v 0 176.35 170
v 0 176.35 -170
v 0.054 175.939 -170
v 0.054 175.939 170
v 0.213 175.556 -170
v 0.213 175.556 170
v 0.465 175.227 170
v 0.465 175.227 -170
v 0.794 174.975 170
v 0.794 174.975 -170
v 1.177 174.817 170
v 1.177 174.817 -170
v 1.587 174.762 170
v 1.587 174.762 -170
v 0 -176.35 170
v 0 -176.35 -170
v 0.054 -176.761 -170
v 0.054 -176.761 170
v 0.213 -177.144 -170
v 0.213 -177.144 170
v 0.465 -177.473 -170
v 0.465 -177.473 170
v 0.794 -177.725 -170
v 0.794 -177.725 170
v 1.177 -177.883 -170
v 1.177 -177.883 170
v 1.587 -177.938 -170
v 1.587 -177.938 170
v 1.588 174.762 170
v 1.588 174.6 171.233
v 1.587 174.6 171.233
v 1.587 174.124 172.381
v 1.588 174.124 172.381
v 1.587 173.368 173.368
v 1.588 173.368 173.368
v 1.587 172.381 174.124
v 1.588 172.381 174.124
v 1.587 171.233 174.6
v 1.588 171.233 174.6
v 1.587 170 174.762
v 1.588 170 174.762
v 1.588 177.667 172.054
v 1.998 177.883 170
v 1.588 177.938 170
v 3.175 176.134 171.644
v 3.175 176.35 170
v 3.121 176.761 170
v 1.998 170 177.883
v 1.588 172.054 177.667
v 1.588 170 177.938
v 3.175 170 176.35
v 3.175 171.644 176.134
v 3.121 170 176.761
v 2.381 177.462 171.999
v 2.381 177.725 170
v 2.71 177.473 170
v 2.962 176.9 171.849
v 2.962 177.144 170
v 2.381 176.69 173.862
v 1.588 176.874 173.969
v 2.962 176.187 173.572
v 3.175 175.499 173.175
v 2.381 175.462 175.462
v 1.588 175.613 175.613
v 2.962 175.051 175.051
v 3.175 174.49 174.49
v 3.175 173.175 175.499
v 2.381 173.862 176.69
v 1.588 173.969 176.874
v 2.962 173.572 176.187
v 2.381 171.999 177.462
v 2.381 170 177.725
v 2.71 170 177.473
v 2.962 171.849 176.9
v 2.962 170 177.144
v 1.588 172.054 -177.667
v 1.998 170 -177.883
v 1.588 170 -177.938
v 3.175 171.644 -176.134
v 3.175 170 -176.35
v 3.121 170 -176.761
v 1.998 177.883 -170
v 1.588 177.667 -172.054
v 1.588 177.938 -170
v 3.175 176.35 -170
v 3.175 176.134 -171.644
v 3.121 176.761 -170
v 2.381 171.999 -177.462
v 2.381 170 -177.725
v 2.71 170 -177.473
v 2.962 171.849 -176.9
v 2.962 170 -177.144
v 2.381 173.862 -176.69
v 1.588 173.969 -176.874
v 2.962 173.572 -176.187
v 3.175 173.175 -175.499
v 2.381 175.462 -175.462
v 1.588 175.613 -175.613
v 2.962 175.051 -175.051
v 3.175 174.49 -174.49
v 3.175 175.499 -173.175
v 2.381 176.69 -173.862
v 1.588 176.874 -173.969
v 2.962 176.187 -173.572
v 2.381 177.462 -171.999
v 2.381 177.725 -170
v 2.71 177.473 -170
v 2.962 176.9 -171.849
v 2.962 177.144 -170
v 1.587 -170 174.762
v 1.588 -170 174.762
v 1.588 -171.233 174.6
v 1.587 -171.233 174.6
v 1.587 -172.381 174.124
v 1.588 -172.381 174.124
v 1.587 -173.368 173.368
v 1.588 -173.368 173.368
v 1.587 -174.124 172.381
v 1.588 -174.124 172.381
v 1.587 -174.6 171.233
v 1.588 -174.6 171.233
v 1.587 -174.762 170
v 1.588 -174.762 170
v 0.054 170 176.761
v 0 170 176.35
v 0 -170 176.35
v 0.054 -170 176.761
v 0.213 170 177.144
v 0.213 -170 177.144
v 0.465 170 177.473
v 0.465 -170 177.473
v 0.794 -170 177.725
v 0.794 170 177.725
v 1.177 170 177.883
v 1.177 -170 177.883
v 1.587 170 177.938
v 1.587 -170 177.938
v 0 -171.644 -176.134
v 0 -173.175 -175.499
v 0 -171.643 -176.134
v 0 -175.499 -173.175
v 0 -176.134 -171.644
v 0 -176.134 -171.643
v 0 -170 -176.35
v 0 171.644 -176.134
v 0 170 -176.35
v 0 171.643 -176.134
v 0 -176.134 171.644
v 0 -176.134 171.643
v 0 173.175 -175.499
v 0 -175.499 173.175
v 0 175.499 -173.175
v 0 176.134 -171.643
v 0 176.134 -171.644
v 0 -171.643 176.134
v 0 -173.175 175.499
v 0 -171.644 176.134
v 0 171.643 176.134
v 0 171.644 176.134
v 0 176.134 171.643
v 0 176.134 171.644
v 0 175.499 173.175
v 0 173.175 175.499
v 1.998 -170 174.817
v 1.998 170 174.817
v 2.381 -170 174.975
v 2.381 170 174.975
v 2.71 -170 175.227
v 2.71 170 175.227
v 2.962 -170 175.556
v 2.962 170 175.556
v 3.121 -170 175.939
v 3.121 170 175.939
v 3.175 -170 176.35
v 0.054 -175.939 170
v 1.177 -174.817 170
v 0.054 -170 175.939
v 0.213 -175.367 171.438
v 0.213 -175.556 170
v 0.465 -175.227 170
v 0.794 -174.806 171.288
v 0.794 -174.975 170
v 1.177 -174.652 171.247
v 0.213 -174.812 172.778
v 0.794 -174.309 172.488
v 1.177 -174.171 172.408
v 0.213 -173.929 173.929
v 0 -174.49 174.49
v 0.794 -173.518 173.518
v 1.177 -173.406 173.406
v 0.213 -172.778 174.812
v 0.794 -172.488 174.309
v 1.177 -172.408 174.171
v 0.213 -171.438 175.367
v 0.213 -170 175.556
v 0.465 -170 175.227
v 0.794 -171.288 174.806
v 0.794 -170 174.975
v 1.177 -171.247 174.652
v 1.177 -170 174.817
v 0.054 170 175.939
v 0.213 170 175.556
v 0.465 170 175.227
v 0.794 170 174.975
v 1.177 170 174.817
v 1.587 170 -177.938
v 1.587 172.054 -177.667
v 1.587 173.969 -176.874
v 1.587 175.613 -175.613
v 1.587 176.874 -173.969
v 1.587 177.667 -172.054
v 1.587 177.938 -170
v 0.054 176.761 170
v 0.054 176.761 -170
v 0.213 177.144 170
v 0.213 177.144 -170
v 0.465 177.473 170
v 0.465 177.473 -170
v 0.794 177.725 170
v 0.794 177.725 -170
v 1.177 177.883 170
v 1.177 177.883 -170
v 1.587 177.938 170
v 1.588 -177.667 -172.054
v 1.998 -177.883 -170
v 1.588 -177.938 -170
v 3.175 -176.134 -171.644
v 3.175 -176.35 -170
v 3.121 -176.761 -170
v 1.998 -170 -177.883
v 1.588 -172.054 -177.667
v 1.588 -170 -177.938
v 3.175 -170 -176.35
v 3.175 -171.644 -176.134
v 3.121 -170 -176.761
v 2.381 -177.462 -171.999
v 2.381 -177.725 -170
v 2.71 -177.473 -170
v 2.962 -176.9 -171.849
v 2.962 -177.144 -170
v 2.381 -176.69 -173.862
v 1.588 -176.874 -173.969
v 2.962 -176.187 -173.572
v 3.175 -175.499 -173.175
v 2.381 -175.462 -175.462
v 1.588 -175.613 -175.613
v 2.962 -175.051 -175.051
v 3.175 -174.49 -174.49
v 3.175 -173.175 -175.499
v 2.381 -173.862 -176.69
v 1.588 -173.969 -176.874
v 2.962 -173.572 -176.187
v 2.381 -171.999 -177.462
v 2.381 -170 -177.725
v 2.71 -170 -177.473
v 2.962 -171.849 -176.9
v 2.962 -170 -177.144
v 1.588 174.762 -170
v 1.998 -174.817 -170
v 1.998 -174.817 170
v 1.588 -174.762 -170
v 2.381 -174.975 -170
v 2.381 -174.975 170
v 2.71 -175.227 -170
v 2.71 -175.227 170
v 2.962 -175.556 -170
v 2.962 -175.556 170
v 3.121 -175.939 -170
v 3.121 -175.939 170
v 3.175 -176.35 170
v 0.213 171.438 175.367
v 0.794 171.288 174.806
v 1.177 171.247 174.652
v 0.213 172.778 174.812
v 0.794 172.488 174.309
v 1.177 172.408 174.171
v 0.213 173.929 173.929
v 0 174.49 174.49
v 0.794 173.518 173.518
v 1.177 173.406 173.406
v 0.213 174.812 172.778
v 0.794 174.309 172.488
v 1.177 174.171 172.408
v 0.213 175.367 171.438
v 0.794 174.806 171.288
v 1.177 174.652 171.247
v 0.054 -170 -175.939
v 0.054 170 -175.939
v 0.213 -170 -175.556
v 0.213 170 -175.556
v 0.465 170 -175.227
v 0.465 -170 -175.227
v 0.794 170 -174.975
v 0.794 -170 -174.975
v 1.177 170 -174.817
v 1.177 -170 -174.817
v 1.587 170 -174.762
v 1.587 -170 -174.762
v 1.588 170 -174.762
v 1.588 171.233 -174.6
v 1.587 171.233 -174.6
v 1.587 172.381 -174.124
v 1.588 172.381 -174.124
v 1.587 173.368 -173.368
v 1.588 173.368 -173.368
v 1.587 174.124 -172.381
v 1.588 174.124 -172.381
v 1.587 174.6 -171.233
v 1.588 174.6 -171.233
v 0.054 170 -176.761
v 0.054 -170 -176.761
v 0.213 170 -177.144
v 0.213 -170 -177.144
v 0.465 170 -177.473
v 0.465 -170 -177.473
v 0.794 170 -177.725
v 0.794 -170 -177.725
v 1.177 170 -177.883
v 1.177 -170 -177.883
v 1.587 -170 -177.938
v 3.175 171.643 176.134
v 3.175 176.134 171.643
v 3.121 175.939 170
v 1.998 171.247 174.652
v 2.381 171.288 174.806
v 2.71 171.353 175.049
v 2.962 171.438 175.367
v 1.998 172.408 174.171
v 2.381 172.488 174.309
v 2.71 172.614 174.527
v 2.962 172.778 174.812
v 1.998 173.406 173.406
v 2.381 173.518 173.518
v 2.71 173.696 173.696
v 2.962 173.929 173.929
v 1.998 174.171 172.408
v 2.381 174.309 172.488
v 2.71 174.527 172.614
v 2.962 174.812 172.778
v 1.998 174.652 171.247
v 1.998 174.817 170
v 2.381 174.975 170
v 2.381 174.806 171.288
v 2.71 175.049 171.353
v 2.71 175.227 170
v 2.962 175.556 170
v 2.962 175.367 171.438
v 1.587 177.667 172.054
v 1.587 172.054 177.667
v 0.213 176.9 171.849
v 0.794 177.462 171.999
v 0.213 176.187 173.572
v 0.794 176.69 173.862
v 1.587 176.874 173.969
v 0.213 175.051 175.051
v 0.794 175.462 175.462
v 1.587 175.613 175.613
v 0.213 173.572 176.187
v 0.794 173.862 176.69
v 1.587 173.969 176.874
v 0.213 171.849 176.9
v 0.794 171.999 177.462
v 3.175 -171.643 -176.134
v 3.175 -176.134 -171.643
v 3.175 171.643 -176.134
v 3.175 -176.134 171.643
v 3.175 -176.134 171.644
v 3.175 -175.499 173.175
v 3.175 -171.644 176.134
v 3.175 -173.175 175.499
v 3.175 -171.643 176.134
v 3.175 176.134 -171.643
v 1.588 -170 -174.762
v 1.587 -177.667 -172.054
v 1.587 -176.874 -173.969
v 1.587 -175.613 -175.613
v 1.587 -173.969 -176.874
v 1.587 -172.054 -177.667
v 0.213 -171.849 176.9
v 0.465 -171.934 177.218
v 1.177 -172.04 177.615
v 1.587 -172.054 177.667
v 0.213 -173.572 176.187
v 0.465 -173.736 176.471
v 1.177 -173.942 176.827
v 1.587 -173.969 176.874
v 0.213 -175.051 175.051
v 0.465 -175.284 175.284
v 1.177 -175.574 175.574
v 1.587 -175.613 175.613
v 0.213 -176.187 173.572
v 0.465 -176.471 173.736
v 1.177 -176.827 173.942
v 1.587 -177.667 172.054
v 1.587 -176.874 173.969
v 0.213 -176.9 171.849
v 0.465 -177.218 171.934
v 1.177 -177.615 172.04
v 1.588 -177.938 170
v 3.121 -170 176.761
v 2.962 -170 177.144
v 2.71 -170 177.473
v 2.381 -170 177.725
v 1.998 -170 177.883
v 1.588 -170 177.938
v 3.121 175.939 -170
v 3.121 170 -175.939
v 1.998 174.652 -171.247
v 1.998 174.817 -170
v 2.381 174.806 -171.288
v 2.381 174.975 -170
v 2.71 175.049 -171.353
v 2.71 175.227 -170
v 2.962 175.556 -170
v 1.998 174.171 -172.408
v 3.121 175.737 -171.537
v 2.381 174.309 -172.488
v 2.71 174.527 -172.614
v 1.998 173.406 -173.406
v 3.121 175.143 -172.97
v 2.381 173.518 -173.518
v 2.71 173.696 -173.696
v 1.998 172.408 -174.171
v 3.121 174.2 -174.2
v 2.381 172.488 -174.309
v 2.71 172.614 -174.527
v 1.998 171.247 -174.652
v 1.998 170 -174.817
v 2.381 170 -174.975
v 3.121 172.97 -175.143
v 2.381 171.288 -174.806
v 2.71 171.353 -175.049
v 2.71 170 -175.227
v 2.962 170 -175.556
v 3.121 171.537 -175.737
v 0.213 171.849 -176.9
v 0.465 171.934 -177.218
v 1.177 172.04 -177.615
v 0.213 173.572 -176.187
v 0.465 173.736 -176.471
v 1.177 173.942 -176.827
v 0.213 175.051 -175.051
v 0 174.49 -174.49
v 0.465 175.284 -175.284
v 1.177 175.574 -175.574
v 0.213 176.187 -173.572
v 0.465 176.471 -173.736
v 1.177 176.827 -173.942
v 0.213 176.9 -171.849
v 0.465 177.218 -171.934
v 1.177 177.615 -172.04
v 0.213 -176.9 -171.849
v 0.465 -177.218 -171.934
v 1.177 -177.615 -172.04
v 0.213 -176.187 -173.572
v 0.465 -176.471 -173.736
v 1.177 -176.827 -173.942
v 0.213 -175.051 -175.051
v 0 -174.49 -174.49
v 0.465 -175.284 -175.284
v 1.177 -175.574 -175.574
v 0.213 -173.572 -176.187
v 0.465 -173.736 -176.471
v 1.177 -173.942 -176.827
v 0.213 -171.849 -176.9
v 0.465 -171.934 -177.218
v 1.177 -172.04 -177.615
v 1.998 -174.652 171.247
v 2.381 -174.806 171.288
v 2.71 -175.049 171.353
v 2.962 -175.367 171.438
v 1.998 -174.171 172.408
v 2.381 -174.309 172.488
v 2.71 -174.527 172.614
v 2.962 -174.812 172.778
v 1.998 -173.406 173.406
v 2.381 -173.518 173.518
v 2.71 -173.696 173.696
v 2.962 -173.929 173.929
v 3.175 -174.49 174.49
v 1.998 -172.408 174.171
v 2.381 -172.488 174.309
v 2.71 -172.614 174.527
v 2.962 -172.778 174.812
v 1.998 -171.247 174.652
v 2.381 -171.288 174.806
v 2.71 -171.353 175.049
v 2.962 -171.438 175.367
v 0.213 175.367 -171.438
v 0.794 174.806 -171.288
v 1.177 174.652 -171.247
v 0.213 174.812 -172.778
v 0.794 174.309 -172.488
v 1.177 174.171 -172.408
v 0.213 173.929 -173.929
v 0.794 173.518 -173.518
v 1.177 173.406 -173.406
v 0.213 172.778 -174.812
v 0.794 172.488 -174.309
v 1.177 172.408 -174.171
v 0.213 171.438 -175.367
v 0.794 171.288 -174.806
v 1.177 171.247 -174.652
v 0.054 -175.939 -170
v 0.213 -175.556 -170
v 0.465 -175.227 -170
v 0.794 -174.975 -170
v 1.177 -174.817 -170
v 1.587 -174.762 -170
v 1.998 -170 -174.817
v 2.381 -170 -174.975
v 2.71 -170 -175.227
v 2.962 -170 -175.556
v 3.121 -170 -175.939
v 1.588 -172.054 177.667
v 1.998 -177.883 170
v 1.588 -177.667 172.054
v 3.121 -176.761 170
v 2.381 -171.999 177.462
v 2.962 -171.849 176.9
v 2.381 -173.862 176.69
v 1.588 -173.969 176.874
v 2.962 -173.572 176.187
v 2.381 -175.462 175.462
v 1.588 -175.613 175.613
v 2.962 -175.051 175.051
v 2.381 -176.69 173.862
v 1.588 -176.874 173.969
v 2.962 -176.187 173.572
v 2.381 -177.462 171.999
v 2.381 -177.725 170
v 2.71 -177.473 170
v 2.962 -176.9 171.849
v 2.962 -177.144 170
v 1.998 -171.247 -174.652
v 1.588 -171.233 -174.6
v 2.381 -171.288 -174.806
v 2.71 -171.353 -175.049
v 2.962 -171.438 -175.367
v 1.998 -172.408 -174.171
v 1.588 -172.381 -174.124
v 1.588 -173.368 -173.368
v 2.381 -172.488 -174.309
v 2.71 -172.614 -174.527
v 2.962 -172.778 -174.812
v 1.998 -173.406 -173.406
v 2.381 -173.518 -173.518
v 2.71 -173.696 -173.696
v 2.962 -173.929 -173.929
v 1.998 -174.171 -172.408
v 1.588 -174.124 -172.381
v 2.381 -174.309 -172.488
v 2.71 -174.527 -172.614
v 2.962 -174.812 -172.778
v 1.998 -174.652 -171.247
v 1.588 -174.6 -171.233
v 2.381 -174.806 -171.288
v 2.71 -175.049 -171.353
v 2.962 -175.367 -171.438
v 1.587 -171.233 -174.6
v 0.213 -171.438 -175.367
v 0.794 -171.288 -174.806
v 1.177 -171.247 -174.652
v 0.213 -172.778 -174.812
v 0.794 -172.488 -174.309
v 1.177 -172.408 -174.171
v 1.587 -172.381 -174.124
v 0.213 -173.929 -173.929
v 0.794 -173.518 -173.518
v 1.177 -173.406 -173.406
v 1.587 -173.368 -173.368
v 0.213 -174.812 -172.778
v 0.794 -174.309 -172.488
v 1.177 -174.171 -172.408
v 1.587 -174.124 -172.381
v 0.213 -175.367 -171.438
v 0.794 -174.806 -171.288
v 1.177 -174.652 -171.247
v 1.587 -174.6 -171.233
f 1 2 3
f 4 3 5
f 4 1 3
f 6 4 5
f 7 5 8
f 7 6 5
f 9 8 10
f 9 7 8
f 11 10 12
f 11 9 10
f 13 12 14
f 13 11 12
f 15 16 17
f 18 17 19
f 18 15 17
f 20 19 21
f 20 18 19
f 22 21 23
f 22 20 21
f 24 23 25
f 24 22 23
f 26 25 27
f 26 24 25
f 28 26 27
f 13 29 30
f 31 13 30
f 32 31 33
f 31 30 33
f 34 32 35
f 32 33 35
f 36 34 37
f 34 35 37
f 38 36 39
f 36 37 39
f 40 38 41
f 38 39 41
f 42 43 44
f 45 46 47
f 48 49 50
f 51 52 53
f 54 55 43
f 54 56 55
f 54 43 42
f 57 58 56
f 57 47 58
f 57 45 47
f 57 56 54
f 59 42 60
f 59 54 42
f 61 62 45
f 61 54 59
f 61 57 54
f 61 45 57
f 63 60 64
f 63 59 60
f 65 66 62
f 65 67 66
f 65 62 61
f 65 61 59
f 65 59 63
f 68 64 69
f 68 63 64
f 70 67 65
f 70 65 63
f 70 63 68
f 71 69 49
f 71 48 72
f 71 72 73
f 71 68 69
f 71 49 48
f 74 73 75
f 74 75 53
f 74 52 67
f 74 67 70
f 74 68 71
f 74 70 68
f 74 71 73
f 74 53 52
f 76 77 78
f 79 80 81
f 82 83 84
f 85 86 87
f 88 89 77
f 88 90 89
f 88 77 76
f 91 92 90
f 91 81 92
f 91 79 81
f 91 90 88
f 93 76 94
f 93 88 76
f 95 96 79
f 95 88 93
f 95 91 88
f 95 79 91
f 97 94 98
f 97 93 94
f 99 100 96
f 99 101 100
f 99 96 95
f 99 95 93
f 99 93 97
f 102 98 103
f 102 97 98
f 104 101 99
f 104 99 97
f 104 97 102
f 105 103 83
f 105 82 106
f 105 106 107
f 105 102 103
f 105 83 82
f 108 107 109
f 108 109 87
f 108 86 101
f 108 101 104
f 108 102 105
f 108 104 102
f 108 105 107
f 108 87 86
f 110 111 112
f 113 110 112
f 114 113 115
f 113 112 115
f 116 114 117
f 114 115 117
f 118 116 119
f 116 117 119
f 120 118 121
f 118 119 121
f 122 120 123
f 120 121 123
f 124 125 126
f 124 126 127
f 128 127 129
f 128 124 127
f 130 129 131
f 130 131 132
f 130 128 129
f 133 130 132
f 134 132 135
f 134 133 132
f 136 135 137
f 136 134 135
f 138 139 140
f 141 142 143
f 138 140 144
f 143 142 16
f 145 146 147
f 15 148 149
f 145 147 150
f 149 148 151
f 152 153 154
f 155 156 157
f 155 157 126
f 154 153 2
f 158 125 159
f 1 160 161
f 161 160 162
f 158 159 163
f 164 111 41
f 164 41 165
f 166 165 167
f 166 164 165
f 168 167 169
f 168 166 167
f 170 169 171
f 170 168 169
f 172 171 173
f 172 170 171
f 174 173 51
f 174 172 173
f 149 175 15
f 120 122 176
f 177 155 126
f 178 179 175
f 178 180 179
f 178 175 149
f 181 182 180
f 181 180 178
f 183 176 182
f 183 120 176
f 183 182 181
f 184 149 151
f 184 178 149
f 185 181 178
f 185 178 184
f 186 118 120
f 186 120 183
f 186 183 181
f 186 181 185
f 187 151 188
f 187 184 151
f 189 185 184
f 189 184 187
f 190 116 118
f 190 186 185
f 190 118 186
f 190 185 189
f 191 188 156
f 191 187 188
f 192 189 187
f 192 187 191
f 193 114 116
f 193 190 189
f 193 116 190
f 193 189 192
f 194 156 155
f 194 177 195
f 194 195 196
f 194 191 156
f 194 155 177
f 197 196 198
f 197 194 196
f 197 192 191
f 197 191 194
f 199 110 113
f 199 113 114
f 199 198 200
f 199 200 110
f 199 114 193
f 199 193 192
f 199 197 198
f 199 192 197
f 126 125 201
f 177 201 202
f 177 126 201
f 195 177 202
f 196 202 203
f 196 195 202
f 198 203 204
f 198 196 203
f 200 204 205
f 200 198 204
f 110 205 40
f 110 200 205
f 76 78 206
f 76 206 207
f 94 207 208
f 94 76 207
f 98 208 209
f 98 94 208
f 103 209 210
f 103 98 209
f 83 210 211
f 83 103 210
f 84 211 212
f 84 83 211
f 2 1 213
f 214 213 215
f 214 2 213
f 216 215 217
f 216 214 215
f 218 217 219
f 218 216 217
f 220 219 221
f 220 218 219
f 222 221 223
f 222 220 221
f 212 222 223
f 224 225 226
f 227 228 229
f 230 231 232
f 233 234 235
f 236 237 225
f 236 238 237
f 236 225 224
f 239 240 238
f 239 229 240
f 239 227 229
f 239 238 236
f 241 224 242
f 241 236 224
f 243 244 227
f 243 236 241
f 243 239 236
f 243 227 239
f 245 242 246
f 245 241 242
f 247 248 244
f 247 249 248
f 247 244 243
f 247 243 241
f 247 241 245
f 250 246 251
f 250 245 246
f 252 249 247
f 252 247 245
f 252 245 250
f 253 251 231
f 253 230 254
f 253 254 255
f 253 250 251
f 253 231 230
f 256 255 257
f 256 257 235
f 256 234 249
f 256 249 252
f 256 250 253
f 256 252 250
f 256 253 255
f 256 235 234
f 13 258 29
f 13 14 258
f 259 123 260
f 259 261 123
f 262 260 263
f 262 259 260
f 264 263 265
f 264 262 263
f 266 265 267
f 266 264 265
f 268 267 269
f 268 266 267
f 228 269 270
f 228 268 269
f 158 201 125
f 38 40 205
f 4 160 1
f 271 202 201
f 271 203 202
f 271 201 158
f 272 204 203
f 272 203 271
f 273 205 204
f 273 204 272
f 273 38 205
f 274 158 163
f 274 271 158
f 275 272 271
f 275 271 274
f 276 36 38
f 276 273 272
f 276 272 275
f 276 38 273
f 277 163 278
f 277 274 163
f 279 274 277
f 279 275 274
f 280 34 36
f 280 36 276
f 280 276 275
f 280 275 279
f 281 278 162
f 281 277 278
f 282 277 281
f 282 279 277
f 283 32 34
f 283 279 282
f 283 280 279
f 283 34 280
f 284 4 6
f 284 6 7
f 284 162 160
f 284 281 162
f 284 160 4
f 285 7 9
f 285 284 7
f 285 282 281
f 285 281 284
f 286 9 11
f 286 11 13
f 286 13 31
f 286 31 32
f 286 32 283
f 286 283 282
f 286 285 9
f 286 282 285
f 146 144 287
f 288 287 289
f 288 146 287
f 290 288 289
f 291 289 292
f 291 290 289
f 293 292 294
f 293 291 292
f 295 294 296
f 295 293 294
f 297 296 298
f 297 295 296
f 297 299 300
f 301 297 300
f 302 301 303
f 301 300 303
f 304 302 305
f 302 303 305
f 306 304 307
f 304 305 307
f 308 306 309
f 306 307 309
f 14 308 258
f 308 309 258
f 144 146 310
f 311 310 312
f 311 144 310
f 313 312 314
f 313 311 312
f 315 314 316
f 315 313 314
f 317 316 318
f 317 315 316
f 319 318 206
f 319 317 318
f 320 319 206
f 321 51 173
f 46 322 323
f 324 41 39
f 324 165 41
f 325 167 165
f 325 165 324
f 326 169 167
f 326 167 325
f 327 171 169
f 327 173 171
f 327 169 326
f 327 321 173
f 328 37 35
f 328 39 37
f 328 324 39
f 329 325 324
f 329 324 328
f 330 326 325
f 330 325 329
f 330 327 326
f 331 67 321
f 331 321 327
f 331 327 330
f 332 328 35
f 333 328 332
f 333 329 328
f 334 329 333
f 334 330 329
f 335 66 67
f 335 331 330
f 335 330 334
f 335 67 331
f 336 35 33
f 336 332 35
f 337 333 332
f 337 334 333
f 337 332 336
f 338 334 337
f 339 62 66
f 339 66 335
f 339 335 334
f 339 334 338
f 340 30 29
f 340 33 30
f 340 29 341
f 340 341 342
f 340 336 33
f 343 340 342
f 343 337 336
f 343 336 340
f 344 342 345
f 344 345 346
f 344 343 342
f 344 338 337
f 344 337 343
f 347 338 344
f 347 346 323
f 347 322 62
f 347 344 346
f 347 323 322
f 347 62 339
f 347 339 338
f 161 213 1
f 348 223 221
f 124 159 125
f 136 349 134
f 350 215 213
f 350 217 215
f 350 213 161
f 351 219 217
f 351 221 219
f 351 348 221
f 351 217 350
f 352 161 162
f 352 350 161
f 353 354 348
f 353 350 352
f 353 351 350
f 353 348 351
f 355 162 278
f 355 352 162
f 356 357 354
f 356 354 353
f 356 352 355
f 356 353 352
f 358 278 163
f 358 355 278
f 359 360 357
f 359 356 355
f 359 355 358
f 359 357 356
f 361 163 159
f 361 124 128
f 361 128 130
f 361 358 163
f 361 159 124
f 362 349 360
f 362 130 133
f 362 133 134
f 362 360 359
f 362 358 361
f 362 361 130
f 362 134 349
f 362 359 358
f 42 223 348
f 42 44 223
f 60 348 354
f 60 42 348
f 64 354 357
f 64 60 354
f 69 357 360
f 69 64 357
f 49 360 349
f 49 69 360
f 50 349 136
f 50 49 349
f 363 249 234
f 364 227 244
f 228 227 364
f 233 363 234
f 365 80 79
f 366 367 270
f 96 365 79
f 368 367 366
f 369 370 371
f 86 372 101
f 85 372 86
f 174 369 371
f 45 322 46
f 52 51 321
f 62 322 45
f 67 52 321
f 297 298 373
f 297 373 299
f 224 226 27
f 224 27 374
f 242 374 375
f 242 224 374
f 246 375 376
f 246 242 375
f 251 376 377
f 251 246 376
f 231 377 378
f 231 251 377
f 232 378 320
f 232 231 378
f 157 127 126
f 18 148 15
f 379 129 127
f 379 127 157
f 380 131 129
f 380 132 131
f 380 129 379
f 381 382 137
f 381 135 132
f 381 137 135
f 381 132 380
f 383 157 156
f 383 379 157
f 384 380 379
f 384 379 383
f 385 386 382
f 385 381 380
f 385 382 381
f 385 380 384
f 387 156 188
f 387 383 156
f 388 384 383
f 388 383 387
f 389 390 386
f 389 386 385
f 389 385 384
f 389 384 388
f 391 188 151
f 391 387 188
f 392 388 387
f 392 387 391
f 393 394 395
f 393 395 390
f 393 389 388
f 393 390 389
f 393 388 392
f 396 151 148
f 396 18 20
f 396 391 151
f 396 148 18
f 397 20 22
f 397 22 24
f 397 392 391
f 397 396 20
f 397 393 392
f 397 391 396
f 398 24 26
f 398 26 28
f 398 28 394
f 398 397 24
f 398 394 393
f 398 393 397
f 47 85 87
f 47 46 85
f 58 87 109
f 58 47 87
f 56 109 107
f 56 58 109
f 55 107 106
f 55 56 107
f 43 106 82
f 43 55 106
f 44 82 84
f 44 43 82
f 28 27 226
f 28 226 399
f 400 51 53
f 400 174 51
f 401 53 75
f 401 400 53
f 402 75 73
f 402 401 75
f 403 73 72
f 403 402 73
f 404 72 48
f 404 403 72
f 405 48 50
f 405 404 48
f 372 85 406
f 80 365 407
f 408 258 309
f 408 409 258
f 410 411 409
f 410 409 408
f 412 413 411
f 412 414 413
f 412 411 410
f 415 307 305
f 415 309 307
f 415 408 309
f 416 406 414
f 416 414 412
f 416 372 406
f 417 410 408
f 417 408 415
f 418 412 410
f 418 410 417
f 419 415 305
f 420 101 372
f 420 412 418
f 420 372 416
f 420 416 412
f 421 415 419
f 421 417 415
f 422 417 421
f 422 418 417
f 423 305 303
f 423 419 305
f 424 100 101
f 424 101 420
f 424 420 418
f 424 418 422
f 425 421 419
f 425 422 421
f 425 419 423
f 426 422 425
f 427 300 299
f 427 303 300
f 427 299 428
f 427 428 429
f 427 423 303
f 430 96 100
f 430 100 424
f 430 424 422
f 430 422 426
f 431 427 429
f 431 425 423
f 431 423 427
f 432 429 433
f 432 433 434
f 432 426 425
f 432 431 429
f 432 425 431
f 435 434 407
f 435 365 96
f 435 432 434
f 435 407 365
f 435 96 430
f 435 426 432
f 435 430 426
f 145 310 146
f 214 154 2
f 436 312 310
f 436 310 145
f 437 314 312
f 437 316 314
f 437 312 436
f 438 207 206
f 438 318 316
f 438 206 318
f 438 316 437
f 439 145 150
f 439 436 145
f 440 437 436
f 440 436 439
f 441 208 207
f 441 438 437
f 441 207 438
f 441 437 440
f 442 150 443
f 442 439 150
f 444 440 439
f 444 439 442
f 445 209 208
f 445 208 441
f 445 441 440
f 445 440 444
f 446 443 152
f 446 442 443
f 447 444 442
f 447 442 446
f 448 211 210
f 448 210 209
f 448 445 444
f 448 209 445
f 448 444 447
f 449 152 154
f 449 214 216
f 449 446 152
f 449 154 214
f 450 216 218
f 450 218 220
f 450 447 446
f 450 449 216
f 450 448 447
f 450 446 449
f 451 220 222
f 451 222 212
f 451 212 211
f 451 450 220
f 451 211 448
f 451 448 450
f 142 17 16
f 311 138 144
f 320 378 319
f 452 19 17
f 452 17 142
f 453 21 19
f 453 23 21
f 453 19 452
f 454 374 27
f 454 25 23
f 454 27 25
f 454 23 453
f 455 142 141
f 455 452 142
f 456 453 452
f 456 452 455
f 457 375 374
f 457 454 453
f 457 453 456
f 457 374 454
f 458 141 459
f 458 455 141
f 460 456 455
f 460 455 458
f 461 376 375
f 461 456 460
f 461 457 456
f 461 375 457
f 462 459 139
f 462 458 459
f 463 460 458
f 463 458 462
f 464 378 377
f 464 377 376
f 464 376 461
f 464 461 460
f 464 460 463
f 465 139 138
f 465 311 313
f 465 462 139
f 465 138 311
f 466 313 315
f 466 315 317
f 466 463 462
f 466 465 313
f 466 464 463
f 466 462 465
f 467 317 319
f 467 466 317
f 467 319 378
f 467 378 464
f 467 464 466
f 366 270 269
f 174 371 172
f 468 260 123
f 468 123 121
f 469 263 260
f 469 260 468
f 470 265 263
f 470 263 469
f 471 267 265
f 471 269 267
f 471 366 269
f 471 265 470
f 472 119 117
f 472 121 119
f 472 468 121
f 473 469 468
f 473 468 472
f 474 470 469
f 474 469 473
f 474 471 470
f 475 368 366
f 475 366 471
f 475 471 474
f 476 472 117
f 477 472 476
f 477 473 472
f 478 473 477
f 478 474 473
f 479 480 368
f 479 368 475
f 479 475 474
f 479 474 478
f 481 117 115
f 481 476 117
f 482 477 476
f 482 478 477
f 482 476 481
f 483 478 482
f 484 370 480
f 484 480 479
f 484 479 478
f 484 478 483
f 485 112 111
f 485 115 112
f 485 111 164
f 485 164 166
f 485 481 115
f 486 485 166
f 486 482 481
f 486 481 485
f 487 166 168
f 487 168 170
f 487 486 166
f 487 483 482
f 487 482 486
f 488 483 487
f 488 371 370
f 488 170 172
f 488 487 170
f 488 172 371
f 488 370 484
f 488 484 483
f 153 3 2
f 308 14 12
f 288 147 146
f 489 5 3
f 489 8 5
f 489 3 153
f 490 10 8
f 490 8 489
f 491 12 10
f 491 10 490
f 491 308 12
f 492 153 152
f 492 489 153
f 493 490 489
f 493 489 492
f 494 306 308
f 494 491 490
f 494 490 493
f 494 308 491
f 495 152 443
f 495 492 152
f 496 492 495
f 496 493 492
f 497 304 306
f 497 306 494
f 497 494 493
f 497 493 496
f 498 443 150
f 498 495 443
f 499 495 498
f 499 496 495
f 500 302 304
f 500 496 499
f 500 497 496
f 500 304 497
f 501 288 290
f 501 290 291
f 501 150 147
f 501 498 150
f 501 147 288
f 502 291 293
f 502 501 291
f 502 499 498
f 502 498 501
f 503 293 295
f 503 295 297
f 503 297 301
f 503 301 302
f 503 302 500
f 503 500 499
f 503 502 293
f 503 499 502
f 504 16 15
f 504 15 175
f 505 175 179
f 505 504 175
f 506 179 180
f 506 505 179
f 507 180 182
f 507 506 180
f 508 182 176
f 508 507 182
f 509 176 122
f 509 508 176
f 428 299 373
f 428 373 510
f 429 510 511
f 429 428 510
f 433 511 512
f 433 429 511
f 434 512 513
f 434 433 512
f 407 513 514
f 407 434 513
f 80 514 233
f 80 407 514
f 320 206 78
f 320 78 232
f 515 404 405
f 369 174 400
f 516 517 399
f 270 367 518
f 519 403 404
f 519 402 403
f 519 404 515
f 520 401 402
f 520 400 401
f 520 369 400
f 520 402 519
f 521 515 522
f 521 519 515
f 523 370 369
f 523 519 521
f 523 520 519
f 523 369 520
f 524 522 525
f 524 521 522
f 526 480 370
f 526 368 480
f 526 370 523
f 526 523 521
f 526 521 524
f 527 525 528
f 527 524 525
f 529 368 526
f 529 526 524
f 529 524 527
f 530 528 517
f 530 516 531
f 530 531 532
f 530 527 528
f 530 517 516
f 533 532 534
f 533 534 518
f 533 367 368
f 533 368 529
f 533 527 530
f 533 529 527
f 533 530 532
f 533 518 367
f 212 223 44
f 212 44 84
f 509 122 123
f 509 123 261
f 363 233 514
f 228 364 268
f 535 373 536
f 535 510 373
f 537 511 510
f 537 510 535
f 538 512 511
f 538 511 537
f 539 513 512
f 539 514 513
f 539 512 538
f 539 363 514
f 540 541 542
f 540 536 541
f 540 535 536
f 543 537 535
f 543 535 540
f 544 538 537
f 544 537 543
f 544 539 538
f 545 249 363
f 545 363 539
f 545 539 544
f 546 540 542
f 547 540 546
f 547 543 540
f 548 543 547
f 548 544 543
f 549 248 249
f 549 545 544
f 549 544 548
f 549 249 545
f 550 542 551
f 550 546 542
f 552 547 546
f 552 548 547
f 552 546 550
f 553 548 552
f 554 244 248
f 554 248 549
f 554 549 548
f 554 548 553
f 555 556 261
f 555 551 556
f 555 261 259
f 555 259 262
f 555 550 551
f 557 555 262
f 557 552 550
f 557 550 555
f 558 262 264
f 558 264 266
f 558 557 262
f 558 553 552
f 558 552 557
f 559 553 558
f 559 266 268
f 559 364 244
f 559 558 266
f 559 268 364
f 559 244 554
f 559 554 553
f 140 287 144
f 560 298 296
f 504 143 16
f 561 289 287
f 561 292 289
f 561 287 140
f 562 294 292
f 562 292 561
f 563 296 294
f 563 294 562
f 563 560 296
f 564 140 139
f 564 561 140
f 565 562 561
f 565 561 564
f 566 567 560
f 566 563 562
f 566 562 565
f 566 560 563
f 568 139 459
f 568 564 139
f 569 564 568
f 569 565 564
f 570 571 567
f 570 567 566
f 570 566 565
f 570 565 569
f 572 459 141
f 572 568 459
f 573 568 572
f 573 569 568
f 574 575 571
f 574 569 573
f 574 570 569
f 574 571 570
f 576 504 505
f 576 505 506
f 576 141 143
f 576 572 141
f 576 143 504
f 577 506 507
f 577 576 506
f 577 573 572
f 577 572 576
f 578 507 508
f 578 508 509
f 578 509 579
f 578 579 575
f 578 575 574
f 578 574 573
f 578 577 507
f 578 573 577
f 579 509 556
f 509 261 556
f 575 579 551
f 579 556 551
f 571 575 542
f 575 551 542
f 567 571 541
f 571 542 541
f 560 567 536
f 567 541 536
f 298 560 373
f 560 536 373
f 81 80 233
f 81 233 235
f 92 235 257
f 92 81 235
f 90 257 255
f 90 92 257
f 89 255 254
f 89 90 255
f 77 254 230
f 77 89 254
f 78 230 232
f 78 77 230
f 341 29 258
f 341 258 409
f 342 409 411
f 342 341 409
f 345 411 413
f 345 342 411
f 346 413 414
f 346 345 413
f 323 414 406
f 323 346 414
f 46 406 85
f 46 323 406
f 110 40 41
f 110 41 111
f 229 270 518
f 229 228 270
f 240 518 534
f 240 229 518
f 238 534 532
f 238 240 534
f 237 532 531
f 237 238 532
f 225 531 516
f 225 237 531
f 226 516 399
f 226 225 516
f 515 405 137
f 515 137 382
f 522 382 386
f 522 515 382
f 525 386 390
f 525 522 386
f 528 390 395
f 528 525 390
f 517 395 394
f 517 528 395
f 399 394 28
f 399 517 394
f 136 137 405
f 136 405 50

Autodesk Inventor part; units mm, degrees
ref_plane "YZ Plane" through (0, 0, 0) normal (1, 0, 0) x (0, 1, 0)
ref_plane "XZ Plane" through (0, 0, 0) normal (0, 1, 0) x (-1, 0, 0)
ref_plane "XY Plane" through (0, 0, 0) normal (0, 0, 1) x (1, 0, 0)
sketch "Sketch1" plane through (0, 0, 0) normal (1, 0, 0) x (0, 1, 0)
  line L0 (-150, -150) -> (150, -150) construction
  line L1 (150, -150) -> (150, 150) construction
  line L2 (150, 150) -> (-150, 150) construction
  line L3 (-150, 150) -> (-150, -150) construction
  line L4 (-150, -150) -> (150, 150) construction
  line L5 (150, -150) -> (-150, 150) construction
  line L6 (-170, 170) -> (170, 170) construction
  line L7 (170, 170) -> (170, -170) construction
  line L8 (170, -170) -> (-170, -170) construction
  line L9 (-170, -170) -> (-170, 170) construction
  line L10 (174.7625, 174.7625) -> (-174.7625, 174.7625)
  line L11 (-174.7625, 174.7625) -> (-174.7625, -174.7625)
  line L12 (-174.7625, -174.7625) -> (174.7625, -174.7625)
  line L13 (174.7625, -174.7625) -> (174.7625, 174.7625)
  line L14 (-177.9375, 177.9375) -> (177.9375, 177.9375)
  line L15 (177.9375, 177.9375) -> (177.9375, -177.9375)
  line L16 (177.9375, -177.9375) -> (-177.9375, -177.9375)
  line L17 (-177.9375, -177.9375) -> (-177.9375, 177.9375)
  point P0 (0, 0)
  dimension "d0" = 300
  dimension "d1" = 300
  dimension "d2" = 20
  dimension "d3" = 4.7625
  dimension "d4" = 3.175
extrude "Extrusion1" add sketch "Sketch1" along normal blind 3.175
fillet "Fillet1" radius 7.9375 4 edges at (1.5875, 177.9375, 177.9375) (1.5875, -177.9375, 177.9375) (1.5875, -177.9375, -177.9375) (1.5875, 177.9375, -177.9375)
fillet "Fillet3" radius 4.7625 4 edges at (1.5875, 174.7625, -174.7625) (1.5875, -174.7625, 174.7625) (1.5875, 174.7625, 174.7625) (1.5875, -174.7625, -174.7625)
fillet "Fillet2" radius 1.5875 24 edges at (3.175, -175.6127, 175.6127) (3.175, -177.9375, 0) (3.175, -175.6127, -175.6127) (3.175, 0, -177.9375) (3.175, 175.6127, -175.6127) (3.175, 177.9375, 0) (3.175, 175.6127, 175.6127) (3.175, 0, 177.9375) (0, 175.6127, 175.6127) (0, 177.9375, 0) (0, 175.6127, -175.6127) (0, 0, -177.9375) (0, -175.6127, -175.6127) (0, -177.9375, 0) (0, -175.6127, 175.6127) (0, 0, 177.9375) (3.175, 174.7625, 0) (3.175, 0, -174.7625) (3.175, -174.7625, 0) (3.175, 0, 174.7625) (0, -174.7625, 0) (0, 0, -174.7625) (0, 174.7625, 0) (0, 0, 174.7625)
equation "\"d0\" = width"
equation "\"d1\" = height"
equation "\"d3\" = 0.375 * facingThickness"
equation "\"d4\" = 0.25 * facingThickness"
equation "\"d5\" = 0.25 * facingThickness"
equation "\"d7\" = 0.625 * facingThickness"
equation "\"d9\" = 0.375 * facingThickness"
equation "\"d8\" = 0.125 * facingThickness"
equation "\"mppcMountThickness\" = 6.35"
equation "\"width\" = 300"
equation "\"height\" = 300"
equation "\"facingThickness\" = 12.7"
equation "\"facingGasketThickness\" = 1.5875"
properties part number "matingORing" material "Rubber"
